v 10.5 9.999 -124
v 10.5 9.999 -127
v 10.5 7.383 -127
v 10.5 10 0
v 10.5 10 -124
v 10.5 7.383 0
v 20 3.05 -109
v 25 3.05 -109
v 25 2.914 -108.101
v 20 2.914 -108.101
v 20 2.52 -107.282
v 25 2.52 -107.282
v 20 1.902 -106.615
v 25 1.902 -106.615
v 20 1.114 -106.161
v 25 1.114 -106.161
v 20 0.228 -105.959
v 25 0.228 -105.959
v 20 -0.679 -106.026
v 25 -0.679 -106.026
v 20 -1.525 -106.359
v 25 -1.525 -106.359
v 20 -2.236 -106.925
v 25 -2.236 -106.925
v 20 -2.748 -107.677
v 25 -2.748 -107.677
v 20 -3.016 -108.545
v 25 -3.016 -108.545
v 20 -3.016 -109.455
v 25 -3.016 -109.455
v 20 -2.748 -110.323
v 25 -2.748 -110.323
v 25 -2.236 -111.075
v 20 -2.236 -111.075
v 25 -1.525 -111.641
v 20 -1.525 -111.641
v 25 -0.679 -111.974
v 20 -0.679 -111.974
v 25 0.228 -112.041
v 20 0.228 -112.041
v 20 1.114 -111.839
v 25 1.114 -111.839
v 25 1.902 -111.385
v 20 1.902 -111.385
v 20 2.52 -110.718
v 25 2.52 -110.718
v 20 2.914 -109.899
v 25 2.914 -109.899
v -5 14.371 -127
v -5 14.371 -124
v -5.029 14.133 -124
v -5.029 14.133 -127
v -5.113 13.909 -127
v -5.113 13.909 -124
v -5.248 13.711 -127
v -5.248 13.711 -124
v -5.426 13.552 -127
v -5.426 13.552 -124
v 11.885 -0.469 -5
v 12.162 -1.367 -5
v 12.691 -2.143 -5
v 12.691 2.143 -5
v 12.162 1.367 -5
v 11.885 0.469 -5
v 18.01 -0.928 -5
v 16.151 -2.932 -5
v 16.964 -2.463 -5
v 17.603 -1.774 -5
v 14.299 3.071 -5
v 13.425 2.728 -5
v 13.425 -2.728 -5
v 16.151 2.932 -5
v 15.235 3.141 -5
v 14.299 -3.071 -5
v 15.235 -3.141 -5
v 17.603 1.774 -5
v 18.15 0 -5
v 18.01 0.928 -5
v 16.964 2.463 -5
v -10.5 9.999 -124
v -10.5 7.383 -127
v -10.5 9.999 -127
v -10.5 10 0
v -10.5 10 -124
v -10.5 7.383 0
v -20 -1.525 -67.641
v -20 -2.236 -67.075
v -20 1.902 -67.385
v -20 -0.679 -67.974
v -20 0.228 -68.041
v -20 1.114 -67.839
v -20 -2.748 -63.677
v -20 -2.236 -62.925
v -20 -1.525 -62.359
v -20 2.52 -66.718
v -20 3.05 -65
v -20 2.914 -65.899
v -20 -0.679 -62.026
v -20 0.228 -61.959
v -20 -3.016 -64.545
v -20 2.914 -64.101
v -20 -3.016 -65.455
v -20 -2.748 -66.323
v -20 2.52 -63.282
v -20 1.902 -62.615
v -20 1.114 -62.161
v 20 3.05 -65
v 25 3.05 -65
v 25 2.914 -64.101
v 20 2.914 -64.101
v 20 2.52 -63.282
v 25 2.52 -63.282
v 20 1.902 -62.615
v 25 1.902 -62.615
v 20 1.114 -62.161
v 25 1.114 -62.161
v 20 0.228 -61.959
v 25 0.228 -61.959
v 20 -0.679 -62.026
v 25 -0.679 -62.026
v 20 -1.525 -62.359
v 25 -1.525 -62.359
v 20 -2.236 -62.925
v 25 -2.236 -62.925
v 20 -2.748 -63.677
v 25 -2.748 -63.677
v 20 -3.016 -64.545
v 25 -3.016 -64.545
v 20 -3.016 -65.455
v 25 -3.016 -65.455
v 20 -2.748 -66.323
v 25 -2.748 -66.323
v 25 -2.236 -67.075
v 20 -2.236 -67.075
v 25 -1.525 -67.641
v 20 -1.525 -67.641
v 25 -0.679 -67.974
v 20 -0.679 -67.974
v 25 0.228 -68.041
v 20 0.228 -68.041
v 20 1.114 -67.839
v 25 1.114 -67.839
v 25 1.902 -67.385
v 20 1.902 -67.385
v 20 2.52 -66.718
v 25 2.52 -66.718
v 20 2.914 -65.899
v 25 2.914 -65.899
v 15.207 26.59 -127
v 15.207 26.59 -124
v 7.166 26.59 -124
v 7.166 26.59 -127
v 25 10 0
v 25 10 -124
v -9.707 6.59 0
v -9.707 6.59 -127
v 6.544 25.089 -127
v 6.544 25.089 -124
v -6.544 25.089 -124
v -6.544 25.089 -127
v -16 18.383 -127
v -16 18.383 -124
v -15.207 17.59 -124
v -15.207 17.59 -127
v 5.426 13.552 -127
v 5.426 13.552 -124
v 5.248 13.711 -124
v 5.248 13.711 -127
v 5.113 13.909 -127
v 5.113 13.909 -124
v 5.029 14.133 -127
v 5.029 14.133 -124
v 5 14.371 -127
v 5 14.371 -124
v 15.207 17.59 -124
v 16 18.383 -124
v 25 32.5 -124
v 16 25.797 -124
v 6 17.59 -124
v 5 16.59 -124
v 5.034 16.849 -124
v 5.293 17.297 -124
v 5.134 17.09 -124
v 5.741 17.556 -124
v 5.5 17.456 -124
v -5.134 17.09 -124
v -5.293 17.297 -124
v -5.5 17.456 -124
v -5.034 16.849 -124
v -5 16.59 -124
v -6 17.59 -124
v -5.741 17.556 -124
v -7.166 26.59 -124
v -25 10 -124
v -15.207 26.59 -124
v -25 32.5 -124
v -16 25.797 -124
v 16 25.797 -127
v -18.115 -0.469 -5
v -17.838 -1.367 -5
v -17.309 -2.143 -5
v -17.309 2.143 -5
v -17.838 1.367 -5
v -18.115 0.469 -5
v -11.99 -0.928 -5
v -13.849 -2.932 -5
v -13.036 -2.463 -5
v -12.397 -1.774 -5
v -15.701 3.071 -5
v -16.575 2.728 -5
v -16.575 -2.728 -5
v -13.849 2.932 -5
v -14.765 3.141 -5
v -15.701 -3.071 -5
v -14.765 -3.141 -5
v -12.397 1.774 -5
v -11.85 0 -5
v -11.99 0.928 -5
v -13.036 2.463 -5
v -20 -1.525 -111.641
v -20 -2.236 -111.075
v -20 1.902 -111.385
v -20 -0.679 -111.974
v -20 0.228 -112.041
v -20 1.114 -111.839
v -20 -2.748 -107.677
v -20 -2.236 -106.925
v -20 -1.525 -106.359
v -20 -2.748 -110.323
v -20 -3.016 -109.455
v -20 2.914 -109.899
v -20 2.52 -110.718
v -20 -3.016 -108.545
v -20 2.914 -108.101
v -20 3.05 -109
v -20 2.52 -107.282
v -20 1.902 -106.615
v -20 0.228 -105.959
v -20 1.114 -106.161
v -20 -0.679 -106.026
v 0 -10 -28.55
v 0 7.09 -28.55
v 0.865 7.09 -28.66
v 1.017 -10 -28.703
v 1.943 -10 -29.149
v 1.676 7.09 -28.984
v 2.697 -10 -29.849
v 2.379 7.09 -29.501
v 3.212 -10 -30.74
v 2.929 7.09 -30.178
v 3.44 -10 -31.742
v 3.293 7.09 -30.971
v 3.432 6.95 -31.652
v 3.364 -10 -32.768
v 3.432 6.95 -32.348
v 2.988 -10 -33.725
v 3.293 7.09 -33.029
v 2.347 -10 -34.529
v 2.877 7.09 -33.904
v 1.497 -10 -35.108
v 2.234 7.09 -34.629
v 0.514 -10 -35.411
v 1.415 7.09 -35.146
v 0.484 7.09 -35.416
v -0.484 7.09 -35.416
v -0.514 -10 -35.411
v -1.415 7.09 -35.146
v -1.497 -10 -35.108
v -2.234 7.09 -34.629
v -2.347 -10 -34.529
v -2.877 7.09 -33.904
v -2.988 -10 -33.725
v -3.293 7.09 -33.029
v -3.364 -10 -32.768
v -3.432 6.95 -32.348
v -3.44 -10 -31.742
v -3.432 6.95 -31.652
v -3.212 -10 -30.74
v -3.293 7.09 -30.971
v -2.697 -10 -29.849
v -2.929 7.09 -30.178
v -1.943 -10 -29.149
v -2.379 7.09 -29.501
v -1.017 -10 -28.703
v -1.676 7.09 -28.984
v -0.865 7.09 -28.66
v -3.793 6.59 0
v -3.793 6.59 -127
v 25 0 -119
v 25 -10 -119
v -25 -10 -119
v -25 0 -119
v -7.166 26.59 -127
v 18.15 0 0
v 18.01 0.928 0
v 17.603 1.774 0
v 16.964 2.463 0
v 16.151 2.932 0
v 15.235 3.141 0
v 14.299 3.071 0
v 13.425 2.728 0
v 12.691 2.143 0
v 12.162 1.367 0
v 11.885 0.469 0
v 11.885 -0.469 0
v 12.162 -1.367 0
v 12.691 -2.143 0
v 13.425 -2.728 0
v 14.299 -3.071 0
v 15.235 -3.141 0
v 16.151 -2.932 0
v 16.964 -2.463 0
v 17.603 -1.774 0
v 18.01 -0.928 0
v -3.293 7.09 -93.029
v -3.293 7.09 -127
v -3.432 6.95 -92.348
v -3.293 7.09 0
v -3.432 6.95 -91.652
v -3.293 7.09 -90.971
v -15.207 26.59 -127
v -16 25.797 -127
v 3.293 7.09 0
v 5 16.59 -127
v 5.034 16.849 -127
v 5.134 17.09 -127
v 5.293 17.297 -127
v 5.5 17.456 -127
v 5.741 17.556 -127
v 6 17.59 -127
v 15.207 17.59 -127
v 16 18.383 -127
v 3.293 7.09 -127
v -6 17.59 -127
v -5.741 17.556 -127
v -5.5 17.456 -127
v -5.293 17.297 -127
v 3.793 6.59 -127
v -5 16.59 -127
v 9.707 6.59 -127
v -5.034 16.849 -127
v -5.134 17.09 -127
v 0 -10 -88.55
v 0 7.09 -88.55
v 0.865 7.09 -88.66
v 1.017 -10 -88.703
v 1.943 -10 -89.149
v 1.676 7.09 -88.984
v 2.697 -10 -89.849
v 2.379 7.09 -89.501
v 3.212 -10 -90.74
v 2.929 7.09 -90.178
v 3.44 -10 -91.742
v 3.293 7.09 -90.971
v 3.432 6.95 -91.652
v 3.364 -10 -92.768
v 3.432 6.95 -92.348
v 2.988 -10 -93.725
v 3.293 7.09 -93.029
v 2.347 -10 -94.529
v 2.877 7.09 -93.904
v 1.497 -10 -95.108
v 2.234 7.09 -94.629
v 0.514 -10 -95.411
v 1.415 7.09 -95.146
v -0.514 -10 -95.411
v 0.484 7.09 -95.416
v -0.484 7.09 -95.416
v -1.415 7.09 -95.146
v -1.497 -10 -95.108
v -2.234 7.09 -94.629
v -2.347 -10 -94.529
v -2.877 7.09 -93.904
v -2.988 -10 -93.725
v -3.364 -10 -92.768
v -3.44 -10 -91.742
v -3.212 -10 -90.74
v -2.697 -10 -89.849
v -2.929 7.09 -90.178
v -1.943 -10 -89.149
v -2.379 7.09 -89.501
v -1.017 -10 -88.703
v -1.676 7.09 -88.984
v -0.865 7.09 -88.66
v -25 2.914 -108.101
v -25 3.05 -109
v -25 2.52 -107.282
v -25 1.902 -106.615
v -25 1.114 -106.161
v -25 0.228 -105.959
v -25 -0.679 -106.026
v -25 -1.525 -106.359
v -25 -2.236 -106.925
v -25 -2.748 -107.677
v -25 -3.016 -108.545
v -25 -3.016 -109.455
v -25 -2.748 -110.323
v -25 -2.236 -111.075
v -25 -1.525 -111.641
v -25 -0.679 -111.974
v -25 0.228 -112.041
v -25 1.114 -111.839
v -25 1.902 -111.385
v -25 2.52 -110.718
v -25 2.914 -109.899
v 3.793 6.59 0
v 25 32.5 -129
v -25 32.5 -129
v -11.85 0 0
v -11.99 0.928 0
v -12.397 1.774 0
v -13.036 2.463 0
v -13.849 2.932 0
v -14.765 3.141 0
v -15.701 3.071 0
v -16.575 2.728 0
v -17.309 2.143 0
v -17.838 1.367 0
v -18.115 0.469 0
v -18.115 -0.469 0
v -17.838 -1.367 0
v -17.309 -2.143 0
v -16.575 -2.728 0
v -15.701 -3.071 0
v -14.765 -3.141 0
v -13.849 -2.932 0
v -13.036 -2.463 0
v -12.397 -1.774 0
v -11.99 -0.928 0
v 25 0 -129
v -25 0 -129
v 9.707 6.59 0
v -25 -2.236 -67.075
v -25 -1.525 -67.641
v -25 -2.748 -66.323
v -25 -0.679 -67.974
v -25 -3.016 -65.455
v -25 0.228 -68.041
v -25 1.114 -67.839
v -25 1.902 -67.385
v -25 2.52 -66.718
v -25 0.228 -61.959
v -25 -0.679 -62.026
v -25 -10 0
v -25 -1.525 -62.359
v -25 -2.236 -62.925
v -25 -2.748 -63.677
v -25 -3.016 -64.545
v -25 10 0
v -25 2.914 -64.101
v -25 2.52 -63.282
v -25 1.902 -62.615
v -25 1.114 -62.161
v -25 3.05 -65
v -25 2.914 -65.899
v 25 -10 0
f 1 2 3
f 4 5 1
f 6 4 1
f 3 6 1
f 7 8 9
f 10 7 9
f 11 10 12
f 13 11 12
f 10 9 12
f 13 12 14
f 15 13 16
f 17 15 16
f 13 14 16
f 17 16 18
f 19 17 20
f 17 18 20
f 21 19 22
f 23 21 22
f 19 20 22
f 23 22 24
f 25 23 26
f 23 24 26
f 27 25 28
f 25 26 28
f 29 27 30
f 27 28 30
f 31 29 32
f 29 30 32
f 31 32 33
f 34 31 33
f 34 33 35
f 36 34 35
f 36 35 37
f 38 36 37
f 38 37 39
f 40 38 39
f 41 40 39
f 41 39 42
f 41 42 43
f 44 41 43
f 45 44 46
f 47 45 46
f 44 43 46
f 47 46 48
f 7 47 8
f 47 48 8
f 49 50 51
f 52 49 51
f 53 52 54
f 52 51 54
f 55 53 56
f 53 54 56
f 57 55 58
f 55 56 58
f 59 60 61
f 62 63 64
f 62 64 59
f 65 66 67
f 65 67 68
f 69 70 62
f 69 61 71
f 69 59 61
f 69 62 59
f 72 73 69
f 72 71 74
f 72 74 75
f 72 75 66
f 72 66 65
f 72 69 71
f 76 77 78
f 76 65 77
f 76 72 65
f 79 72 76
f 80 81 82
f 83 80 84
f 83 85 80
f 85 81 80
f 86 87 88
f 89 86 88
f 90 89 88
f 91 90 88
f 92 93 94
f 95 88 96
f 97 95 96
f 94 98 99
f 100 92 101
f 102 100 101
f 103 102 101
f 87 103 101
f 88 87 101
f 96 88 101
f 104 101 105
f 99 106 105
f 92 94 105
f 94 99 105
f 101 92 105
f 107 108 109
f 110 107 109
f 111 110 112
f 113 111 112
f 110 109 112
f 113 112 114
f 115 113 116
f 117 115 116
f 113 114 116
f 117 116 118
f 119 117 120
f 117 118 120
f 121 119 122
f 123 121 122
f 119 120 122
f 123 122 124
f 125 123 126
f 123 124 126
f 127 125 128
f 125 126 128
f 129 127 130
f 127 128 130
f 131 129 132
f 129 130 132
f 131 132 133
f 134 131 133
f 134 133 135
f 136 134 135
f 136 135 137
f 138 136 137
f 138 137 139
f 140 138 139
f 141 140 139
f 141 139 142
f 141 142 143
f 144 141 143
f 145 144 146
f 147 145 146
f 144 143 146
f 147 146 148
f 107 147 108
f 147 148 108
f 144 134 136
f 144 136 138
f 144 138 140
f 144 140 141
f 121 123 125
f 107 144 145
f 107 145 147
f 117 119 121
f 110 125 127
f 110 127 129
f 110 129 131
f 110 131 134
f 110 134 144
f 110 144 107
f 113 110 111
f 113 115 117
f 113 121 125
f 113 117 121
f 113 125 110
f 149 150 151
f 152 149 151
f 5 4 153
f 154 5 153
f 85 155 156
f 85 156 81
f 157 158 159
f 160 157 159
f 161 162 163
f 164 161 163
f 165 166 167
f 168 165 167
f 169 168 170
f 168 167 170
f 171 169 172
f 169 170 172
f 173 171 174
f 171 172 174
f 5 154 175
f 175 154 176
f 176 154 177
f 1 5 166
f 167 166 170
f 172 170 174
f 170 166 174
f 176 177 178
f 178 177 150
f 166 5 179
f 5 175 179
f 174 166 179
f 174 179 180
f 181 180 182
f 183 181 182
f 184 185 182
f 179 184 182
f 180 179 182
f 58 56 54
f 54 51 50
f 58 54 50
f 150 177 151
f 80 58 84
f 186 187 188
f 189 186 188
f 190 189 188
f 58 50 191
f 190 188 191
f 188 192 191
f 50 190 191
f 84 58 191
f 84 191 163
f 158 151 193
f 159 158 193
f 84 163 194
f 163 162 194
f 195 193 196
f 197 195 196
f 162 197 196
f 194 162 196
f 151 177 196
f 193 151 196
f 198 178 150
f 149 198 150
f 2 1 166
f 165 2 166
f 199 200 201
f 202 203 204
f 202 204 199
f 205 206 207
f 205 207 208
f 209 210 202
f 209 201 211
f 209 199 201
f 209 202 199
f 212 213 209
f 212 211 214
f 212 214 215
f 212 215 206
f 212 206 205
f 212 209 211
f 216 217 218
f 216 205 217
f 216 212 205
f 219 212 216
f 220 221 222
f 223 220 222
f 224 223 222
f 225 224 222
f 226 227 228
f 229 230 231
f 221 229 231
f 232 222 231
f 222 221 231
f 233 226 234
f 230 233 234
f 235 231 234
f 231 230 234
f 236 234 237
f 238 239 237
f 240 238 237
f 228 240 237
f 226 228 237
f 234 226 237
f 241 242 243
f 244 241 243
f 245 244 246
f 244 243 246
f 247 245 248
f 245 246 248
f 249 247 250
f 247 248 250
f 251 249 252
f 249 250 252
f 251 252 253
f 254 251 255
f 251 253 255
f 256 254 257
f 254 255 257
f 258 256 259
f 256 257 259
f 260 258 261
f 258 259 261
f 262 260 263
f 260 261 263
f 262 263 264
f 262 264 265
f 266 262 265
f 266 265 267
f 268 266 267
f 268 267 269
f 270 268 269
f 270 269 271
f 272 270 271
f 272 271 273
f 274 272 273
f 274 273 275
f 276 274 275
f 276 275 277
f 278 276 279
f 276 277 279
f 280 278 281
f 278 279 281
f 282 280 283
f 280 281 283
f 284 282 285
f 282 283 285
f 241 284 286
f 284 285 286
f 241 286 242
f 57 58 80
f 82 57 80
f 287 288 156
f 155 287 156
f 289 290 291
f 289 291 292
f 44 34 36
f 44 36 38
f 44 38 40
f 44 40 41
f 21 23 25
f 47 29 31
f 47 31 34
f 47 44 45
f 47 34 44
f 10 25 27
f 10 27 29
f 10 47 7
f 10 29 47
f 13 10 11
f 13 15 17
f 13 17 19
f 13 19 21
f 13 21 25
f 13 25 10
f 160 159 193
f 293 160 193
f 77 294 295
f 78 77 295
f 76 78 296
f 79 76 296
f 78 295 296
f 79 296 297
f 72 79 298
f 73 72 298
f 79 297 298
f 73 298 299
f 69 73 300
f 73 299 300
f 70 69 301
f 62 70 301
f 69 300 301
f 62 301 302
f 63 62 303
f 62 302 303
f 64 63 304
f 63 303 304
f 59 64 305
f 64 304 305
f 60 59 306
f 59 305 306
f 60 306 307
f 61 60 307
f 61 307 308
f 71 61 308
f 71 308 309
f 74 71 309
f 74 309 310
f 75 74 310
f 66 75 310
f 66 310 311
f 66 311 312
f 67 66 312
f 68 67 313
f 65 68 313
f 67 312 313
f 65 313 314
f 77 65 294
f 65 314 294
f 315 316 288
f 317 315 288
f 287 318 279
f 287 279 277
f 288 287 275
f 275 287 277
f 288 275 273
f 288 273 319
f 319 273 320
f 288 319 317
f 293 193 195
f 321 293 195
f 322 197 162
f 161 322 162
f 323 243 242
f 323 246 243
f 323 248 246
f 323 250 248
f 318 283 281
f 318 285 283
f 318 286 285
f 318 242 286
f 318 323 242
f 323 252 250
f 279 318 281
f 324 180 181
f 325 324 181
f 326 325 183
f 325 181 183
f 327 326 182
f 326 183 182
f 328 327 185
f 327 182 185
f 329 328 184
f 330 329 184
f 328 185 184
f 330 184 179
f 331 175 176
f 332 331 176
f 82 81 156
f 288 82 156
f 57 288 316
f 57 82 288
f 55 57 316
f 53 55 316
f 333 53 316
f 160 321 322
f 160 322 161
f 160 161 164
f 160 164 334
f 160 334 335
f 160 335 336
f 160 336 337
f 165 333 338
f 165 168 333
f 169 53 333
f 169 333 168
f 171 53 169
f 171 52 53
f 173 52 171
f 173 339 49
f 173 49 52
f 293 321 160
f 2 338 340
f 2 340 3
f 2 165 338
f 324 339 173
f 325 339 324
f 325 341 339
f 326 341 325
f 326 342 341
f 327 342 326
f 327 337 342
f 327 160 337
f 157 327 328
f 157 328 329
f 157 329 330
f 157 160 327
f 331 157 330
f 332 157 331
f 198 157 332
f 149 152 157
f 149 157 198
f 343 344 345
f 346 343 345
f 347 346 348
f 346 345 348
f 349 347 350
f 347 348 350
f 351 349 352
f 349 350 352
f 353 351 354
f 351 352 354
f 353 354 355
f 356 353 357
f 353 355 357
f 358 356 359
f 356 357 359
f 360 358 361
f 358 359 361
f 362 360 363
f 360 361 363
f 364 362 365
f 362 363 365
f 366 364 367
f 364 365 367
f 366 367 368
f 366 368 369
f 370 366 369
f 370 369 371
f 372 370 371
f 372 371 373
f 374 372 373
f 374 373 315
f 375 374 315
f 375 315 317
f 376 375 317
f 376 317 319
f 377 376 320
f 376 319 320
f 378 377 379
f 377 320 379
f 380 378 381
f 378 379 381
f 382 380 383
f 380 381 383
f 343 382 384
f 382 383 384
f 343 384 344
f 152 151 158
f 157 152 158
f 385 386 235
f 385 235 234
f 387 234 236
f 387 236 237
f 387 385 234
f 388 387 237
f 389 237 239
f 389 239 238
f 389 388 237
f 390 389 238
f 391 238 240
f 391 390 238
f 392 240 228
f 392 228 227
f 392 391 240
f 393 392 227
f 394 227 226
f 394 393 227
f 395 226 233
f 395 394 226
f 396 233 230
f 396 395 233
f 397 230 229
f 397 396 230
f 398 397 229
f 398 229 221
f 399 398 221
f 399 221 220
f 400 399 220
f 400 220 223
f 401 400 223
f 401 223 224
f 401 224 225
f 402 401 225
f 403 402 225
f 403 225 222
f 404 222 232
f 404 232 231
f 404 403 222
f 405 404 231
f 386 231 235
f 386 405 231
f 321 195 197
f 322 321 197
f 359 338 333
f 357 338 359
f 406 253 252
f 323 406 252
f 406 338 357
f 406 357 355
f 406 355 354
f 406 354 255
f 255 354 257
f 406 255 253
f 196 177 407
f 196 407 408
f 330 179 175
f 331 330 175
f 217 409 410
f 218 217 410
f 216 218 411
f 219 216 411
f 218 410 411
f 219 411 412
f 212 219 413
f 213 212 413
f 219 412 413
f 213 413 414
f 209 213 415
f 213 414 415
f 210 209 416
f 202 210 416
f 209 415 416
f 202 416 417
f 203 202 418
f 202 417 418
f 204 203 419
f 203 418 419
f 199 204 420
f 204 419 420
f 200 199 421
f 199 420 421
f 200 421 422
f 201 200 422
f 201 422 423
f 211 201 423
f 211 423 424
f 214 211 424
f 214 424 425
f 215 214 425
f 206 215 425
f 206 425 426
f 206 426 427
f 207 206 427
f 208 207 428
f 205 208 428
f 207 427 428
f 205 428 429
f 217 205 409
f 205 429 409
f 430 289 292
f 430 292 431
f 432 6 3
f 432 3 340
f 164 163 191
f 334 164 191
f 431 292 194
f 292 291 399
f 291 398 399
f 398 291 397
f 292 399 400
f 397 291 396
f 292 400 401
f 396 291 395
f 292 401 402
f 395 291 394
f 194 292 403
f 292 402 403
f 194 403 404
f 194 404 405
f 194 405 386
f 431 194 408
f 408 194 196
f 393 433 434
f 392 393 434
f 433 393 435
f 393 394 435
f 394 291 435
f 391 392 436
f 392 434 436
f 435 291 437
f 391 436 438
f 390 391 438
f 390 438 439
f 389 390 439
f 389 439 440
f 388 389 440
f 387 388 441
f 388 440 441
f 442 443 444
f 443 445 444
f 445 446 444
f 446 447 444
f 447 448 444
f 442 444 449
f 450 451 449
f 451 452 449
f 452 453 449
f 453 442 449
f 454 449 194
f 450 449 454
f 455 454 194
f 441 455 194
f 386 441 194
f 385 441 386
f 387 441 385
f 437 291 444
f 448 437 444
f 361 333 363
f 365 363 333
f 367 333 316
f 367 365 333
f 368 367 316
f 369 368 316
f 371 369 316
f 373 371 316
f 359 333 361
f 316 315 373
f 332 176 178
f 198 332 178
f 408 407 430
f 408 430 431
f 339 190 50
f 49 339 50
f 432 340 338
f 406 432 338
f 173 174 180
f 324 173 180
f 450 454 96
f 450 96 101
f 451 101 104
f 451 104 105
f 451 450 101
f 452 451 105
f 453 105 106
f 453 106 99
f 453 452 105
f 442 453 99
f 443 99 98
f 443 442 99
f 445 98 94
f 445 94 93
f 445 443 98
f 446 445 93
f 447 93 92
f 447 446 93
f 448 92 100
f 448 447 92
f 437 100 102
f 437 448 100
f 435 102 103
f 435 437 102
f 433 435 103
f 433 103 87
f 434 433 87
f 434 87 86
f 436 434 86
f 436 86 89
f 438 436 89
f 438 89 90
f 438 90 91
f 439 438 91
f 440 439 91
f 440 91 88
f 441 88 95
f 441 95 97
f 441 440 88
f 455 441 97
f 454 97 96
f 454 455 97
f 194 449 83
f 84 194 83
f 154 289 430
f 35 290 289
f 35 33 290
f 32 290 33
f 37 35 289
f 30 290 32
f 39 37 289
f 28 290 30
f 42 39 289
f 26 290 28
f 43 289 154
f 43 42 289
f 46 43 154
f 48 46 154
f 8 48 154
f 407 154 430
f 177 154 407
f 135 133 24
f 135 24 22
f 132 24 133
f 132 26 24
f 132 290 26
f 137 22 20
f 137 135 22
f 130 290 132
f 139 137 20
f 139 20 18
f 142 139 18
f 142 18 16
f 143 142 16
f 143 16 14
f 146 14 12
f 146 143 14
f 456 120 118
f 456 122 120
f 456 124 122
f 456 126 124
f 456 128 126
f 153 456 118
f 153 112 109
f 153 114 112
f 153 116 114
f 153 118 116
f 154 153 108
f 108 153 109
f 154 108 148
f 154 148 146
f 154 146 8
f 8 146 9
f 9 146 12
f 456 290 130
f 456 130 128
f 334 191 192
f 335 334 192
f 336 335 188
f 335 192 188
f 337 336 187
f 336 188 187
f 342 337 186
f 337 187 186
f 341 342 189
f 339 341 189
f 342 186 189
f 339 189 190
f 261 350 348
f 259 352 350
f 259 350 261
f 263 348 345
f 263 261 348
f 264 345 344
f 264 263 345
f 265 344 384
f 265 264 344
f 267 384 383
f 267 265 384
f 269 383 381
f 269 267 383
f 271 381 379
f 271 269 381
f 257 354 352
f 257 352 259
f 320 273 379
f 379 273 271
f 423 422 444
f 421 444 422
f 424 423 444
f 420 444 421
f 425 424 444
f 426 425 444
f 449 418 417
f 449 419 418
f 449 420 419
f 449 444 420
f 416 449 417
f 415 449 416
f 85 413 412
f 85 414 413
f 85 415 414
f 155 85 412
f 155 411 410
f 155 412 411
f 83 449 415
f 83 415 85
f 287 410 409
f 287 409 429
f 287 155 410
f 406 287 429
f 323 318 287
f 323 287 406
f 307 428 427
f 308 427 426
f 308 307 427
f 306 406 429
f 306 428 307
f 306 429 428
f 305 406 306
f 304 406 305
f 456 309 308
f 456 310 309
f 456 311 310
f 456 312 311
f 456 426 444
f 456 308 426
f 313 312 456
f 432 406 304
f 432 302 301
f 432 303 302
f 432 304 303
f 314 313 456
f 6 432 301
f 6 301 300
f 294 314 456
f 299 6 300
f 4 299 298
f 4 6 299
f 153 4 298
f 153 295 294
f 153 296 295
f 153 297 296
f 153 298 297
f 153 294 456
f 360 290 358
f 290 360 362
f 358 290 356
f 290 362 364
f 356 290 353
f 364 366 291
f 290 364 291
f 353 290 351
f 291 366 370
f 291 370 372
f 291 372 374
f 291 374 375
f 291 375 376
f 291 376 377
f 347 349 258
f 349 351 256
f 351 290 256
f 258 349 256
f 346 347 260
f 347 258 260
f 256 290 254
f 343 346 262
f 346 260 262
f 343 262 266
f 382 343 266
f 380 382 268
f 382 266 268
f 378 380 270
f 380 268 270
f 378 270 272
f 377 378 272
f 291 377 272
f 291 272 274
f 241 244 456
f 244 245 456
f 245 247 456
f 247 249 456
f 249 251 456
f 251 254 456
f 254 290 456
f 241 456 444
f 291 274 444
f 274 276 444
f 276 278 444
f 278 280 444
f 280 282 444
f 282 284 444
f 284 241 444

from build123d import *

# Parameters (mm, degrees)
SKETCH1_W           = 50
SKETCH1_H           = 20
BOSS_EXTRUDE1_DEPTH = 124
CUT_EXTRUDE1_REACH  = 128.89
SKETCH4_W           = 50
SKETCH4_H           = 42.5
BOSS_EXTRUDE2_DEPTH = 5
CUT_EXTRUDE2_DEPTH  = 3
SKETCH6_R           = 3.45
CUT_EXTRUDE3_DEPTH  = 134.834494571
SKETCH7_W           = 10
SKETCH7_H           = 10
CUT_EXTRUDE4_DEPTH  = 143.11702924
SKETCH8_R           = 3.05
CUT_EXTRUDE5_DEPTH  = 5
SKETCH9_R           = 3.15
CUT_EXTRUDE6_DEPTH  = 5


with BuildPart() as part:
    # Sketch1 → Boss-Extrude1 (new body)
    with BuildSketch(Plane.XY):
        Rectangle(SKETCH1_W, SKETCH1_H)
    extrude(amount=-BOSS_EXTRUDE1_DEPTH)

    # Sketch2 → Cut-Extrude1 (cut, up to next)
    with BuildSketch(Plane.XY, mode=Mode.PRIVATE) as cut_extrude1_sk1:
        Polygon((-10.499848989, 10.238924494), (0, 10.238924494), (10.499848989, 10.238924494), (10.499848989, 7.382817713), (9.707031275, 6.59), (3.792817713, 6.59), (3.292893219, 7.089924494), (-3.292893219, 7.089924494), (-3.792817713, 6.59), (-9.707031275, 6.59), (-10.499848989, 7.382817713), align=None)
    cut_extrude1_tool1 = extrude(cut_extrude1_sk1.sketch, amount=-CUT_EXTRUDE1_REACH, mode=Mode.PRIVATE) & part.part
    add(cut_extrude1_tool1.solids().sort_by_distance((0, 8.505261, 0))[0], mode=Mode.SUBTRACT)

    # Sketch4 → Boss-Extrude2 (add)
    with BuildSketch(Plane(origin=(0, 0, -124), x_dir=(-1, 0, 0), z_dir=(0, 0, -1))):
        with Locations((0, 11.25)):
            Rectangle(SKETCH4_W, SKETCH4_H)
    extrude(amount=BOSS_EXTRUDE2_DEPTH)

    # Sketch5 → Cut-Extrude2 (cut)
    with BuildSketch(Plane.XY.offset(-124)):
        with BuildLine():
            Line((-3.292893219, 7.089924494), (3.292893219, 7.089924494))
            Line((3.292893219, 7.089924494), (3.792817713, 6.59))
            Line((3.792817713, 6.59), (9.707031275, 6.59))
            Line((9.707031275, 6.59), (10.499848989, 7.382817713))
            Line((10.499848989, 7.382817713), (10.499848989, 9.99920802))
            Line((10.499848989, 9.99920802), (5.426401458, 13.551674225))
            ThreePointArc((5.426401458, 13.551674225), (5.112967061, 13.909077656), (4.999977894, 14.37082627))
            Line((4.999977894, 14.37082627), (4.999977894, 16.58982627))
            ThreePointArc((4.999977894, 16.58982627), (5.292871113, 17.296933051), (5.999977894, 17.58982627))
            Line((5.999977894, 17.58982627), (15.207084675, 17.58982627))
            Line((15.207084675, 17.58982627), (15.999902388, 18.382643983))
            Line((15.999902388, 18.382643983), (15.999902388, 25.796857545))
            Line((15.999902388, 25.796857545), (15.207084675, 26.589675258))
            Line((15.207084675, 26.589675258), (7.165888575, 26.589675258))
            Line((7.165888575, 26.589675258), (6.544410681, 25.089294897))
            Line((6.544410681, 25.089294897), (-6.544410681, 25.089294897))
            Line((-6.544410681, 25.089294897), (-7.165888575, 26.589675258))
            Line((-7.165888575, 26.589675258), (-15.207084675, 26.589675258))
            Line((-15.207084675, 26.589675258), (-15.999902388, 25.796857545))
            Line((-15.999902388, 25.796857545), (-15.999902388, 18.382643983))
            Line((-15.999902388, 18.382643983), (-15.207084675, 17.58982627))
            Line((-15.207084675, 17.58982627), (-5.999977894, 17.58982627))
            ThreePointArc((-5.999977894, 17.58982627), (-5.292871113, 17.296933051), (-4.999977894, 16.58982627))
            Line((-4.999977894, 16.58982627), (-4.999977894, 14.37082627))
            ThreePointArc((-4.999977894, 14.37082627), (-5.112967061, 13.909077656), (-5.426401458, 13.551674225))
            Line((-5.426401458, 13.551674225), (-10.499848989, 9.99920802))
            Line((-10.499848989, 9.99920802), (-10.499848989, 7.382817713))
            Line((-10.499848989, 7.382817713), (-9.707031275, 6.59))
            Line((-9.707031275, 6.59), (-3.792817713, 6.59))
            Line((-3.792817713, 6.59), (-3.292893219, 7.089924494))
        make_face()
    extrude(amount=-CUT_EXTRUDE2_DEPTH, mode=Mode.SUBTRACT)

    # Sketch6 → Cut-Extrude3 (cut, through all)
    with BuildSketch(Plane(origin=(0, 7.089924494, 0), x_dir=(1, 0, 0), z_dir=(0, 1, 0))):
        with Locations(Location((0, 92, 0), (0, 0, 270))):
            Circle(SKETCH6_R)
        with Locations(Location((0, 32, 0), (0, 0, 270))):
            Circle(SKETCH6_R)
    extrude(amount=-CUT_EXTRUDE3_DEPTH, mode=Mode.SUBTRACT)

    # Sketch7 → Cut-Extrude4 (cut, through all)
    with BuildSketch(Plane(origin=(25, 0, 0), x_dir=(0, 0, -1), z_dir=(1, 0, 0))):
        with Locations((124, -5)):
            Rectangle(SKETCH7_W, SKETCH7_H)
    extrude(amount=-CUT_EXTRUDE4_DEPTH, mode=Mode.SUBTRACT)

    # Sketch8 → Cut-Extrude5 (cut)
    with BuildSketch(Plane(origin=(25, 0, 0), x_dir=(0, 0, -1), z_dir=(1, 0, 0))):
        with Locations(Location((109, 0, 0), (0, 0, 90))):
            Circle(SKETCH8_R)
        with Locations(Location((65, 0, 0), (0, 0, 90))):
            Circle(SKETCH8_R)
    cut_extrude5 = extrude(amount=-CUT_EXTRUDE5_DEPTH, mode=Mode.SUBTRACT)

    # Mirror1: Cut-Extrude5 across plane
    add(cut_extrude5.mirror(Plane(origin=(0, 0, 0), x_dir=(0, 0, 1), z_dir=(1, 0, 0))), mode=Mode.SUBTRACT)

    # Sketch9 → Cut-Extrude6 (cut)
    with BuildSketch(Plane.XY):
        with Locations((-15, 0)):
            Circle(SKETCH9_R)
        with Locations((15, 0)):
            Circle(SKETCH9_R)
    extrude(amount=-CUT_EXTRUDE6_DEPTH, mode=Mode.SUBTRACT)


solid = part.part
